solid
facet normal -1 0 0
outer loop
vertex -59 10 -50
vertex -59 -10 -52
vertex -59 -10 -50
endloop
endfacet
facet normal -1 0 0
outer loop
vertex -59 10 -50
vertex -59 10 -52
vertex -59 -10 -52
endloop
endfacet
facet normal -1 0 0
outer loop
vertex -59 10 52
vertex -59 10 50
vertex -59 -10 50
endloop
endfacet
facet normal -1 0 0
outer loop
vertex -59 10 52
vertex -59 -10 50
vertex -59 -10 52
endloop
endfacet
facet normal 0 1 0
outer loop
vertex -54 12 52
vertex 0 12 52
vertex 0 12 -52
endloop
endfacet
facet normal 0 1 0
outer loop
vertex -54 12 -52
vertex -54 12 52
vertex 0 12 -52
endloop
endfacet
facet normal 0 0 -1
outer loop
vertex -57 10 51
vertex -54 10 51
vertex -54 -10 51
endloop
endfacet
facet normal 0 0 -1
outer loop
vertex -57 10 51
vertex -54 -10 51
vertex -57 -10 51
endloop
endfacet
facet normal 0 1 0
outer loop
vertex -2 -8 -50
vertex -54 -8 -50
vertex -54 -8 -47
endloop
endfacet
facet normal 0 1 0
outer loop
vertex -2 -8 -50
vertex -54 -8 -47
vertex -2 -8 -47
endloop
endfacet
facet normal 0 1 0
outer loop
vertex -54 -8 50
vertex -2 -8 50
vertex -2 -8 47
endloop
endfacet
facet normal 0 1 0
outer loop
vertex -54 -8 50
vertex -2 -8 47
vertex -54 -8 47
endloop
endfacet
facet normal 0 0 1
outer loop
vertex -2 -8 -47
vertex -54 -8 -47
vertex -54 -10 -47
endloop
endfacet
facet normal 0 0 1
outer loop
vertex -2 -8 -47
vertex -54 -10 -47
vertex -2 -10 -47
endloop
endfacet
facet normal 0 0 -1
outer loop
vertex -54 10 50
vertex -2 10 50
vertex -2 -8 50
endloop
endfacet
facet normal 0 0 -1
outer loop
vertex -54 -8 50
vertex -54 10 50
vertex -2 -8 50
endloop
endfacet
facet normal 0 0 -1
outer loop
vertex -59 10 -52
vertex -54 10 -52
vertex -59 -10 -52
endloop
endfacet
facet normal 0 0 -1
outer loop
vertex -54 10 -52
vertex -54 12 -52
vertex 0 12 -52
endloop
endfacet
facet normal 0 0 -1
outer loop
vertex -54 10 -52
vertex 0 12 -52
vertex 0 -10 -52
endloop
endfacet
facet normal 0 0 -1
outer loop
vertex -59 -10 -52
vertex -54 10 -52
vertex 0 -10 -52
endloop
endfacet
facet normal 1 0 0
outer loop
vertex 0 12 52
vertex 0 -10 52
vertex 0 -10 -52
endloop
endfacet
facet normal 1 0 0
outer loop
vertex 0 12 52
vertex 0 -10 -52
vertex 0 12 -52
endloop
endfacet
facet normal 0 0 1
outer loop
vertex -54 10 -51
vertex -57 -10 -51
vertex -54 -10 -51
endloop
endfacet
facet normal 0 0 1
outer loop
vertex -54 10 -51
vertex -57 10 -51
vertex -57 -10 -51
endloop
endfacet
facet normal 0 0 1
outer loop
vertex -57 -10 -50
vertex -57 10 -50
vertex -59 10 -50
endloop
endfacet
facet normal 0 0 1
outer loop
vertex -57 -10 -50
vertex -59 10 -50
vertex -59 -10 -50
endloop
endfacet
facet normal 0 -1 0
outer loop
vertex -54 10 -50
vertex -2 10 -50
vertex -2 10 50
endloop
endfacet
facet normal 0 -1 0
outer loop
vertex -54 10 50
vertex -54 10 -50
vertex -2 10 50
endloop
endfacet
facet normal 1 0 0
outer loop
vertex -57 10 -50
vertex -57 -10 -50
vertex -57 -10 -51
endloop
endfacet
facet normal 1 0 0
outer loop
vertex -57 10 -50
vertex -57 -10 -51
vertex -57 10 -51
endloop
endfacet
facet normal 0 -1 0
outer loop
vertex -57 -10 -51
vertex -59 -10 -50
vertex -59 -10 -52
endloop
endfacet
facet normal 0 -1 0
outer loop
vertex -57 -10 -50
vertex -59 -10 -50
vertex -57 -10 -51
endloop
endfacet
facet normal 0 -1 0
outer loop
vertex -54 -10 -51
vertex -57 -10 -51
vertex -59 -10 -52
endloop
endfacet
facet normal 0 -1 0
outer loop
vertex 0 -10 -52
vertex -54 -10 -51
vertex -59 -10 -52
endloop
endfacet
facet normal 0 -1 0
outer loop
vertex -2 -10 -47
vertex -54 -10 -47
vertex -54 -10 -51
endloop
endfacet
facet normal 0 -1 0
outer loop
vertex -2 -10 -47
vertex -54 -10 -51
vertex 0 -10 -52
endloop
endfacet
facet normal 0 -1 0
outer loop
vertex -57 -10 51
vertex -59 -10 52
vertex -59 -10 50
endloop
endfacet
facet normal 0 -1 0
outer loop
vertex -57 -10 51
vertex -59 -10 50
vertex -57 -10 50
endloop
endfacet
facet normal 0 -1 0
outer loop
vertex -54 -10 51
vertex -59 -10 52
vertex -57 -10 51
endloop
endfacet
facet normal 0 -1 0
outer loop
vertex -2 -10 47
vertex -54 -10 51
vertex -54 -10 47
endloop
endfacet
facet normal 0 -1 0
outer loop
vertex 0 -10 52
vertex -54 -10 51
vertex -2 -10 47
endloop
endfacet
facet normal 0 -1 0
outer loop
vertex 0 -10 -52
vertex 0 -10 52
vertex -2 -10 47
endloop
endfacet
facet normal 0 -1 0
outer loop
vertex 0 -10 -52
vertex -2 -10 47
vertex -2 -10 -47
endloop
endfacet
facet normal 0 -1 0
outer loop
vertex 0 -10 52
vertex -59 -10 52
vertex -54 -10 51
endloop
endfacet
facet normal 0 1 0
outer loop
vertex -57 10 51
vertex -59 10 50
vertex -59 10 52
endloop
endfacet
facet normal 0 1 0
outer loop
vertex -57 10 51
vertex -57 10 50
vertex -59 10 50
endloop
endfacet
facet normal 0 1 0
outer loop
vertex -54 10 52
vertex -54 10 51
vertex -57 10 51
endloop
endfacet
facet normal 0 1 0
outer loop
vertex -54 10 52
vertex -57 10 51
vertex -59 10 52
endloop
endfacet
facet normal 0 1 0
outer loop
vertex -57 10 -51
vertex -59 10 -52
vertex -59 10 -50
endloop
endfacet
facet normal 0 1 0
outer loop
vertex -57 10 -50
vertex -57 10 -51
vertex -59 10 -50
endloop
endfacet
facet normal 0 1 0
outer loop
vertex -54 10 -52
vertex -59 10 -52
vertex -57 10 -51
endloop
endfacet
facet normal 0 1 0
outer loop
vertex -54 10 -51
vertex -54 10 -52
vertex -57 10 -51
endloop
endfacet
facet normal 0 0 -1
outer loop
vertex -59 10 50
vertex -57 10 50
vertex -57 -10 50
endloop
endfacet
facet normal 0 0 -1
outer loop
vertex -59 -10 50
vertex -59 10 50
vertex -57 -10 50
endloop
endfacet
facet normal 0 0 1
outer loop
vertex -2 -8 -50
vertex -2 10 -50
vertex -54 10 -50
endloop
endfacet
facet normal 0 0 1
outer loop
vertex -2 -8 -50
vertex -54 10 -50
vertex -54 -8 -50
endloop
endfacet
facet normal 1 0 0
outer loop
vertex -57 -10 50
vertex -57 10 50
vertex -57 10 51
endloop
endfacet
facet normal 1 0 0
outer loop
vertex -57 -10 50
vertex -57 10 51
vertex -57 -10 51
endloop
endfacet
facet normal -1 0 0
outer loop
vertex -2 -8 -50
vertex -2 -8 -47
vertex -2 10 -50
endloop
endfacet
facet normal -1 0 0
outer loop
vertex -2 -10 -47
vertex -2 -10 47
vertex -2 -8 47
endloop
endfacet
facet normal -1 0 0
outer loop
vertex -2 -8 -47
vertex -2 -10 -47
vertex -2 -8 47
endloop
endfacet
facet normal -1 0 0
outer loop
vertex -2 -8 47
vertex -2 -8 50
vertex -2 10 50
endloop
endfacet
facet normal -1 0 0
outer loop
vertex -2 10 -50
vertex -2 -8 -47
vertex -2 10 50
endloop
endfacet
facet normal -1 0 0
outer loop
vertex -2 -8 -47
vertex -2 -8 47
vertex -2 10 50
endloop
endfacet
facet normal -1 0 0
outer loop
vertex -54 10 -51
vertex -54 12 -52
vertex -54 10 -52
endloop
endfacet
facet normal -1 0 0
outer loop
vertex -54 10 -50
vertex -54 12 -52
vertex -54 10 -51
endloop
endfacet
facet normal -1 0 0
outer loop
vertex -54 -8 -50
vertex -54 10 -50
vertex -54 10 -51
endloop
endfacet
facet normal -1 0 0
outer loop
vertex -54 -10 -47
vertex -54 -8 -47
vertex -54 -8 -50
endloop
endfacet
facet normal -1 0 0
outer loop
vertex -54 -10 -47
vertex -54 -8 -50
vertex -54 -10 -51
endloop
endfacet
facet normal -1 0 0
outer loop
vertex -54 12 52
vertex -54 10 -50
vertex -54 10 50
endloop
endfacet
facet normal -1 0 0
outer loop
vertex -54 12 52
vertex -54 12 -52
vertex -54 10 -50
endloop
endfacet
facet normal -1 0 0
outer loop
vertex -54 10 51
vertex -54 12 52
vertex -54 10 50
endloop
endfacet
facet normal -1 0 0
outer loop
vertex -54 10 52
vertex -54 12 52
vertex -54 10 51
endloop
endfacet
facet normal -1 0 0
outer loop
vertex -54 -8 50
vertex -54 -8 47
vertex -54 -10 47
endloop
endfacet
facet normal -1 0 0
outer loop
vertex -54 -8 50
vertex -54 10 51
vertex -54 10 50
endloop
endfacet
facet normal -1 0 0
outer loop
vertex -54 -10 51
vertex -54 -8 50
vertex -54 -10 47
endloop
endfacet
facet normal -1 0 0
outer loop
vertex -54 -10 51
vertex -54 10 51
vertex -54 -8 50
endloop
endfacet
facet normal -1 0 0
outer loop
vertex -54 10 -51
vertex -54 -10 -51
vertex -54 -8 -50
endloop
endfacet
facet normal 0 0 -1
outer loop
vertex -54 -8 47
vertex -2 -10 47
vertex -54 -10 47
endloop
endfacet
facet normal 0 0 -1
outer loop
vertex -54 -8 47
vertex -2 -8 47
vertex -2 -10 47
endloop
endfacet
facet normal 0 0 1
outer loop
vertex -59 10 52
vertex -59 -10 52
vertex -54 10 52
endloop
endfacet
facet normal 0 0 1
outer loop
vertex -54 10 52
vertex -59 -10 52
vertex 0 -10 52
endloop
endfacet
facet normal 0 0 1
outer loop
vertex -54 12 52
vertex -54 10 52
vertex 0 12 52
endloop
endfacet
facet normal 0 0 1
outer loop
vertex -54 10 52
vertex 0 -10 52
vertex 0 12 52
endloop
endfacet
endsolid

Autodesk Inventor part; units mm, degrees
ref_plane "YZ Plane" through (0, 0, 0) normal (1, 0, 0) x (0, 1, 0)
ref_plane "XZ Plane" through (0, 0, 0) normal (0, 1, 0) x (-1, 0, 0)
ref_plane "XY Plane" through (0, 0, 0) normal (0, 0, 1) x (1, 0, 0)
sketch "Sketch1" plane through (0, 0, 0) normal (1, 0, 0) x (0, 1, 0)
  line L0 (10, 52) -> (-10, 52)
  line L1 (-10, 52) -> (-10, -52)
  line L2 (-10, -52) -> (10, -52)
  line L3 (10, -52) -> (10, 52)
  point P0 (0, 0)
  dimension "d0" = 104
  dimension "d1" = 20
  dimension "d2" = 52
  dimension "d3" = 10
extrude "Extrusion1" add sketch "Sketch1" against normal blind 2
sketch "Sketch2" plane through (-2, 0, 0) normal (-1, 0, 0) x (0, 0, 1)
  line L0 (52, 10) -> (-52, 10) projected
  line L1 (-52, -10) -> (52, -10) projected
  line L2 (-52, 10) -> (-50, 10)
  line L3 (-50, 10) -> (-50, -10)
  line L4 (-50, -10) -> (-52, -10)
  line L5 (-52, -10) -> (-52, 10)
  line L6 (52, -10) -> (52, 10) projected
  line L7 (52, 10) -> (50, 10)
  line L8 (50, 10) -> (50, -10)
  line L9 (50, -10) -> (52, -10)
  line L10 (52, -10) -> (52, 10)
  point P0 (0, 0)
  dimension "d6" = 2
  dimension "d7" = 2
extrude "Extrusion2" add sketch "Sketch2" along normal blind 57 contours L6 L1 L8 L0 | L3 L1 L5 L0
sketch "Sketch3" plane through (0, 0, 0) normal (1, 0, 0) x (0, 0, -1)
  line L0 (52, 10) -> (-52, 10) projected
  line L1 (52, 10) -> (-52, 10)
  line L2 (-52, 10) -> (-52, 12)
  line L3 (-52, 12) -> (52, 12)
  line L4 (52, 12) -> (52, 10)
  line L5 (-52, 10) -> (-52, -10) projected
  point P0 (0, 0)
  dimension "d10" = 2
  dimension "d11" = 0
extrude "Extrusion3" add sketch "Sketch3" against normal blind 54
sketch "Sketch6" plane through (-2, -10, 50) normal (0, 0, -1) x (-1, 0, 0)
  line L0 (52, 20) -> (57, 20) projected
  line L1 (0, 0) -> (57, 0) projected
  line L2 (52, 20) -> (55, 20)
  line L3 (55, 20) -> (55, 0)
  line L4 (55, 0) -> (52, 0)
  line L5 (52, 0) -> (52, 20)
  line L6 (57, 20) -> (57, 0) projected
  point P0 (-2, 10)
  dimension "d16" = 2
  dimension "d17" = 3
sketch "Sketch7" plane through (-59, -10, -50) normal (0, 0, 1) x (1, 0, 0)
  line L0 (5, 20) -> (0, 20) projected
  line L1 (59, 0) -> (0, 0) projected
  line L2 (2, 20) -> (5, 20)
  line L3 (5, 20) -> (5, 0)
  line L4 (5, 0) -> (2, 0)
  line L5 (2, 0) -> (2, 20)
  line L6 (0, 0) -> (0, 20) projected
  point P0 (59, 10)
  dimension "d18" = 3
  dimension "d19" = 2
extrude "Extrusion4" cut sketch "Sketch7" against normal blind 1 contours L3 L1 L5 L0
extrude "Extrusion5" cut sketch "Sketch6" against normal blind 1 contours L0 L3 L1 L5
sketch "Sketch8" plane through (-2, -10, -50) normal (0, 0, 1) x (1, 0, 0)
  line L0 (-52, 20) -> (-52, 0) projected
  line L1 (0, 0) -> (-52, 0)
  line L2 (-52, 0) -> (-52, 2)
  line L3 (-52, 2) -> (0, 2)
  line L4 (0, 2) -> (0, 0)
  point P0 (2, 10)
  dimension "d24" = 2
sketch "Sketch9" plane through (-2, -10, 50) normal (0, 0, -1) x (-1, 0, 0)
  line L0 (52, 0) -> (0, 0)
  line L1 (0, 0) -> (0, 2)
  line L2 (0, 2) -> (52, 2)
  line L3 (52, 2) -> (52, 0)
  point P0 (-2, 10)
  dimension "d25" = 2
extrude "Extrusion6" add sketch "Sketch8" along normal blind 3
extrude "Extrusion7" add sketch "Sketch9" along normal blind 3
properties part number "LEDs_protect"
